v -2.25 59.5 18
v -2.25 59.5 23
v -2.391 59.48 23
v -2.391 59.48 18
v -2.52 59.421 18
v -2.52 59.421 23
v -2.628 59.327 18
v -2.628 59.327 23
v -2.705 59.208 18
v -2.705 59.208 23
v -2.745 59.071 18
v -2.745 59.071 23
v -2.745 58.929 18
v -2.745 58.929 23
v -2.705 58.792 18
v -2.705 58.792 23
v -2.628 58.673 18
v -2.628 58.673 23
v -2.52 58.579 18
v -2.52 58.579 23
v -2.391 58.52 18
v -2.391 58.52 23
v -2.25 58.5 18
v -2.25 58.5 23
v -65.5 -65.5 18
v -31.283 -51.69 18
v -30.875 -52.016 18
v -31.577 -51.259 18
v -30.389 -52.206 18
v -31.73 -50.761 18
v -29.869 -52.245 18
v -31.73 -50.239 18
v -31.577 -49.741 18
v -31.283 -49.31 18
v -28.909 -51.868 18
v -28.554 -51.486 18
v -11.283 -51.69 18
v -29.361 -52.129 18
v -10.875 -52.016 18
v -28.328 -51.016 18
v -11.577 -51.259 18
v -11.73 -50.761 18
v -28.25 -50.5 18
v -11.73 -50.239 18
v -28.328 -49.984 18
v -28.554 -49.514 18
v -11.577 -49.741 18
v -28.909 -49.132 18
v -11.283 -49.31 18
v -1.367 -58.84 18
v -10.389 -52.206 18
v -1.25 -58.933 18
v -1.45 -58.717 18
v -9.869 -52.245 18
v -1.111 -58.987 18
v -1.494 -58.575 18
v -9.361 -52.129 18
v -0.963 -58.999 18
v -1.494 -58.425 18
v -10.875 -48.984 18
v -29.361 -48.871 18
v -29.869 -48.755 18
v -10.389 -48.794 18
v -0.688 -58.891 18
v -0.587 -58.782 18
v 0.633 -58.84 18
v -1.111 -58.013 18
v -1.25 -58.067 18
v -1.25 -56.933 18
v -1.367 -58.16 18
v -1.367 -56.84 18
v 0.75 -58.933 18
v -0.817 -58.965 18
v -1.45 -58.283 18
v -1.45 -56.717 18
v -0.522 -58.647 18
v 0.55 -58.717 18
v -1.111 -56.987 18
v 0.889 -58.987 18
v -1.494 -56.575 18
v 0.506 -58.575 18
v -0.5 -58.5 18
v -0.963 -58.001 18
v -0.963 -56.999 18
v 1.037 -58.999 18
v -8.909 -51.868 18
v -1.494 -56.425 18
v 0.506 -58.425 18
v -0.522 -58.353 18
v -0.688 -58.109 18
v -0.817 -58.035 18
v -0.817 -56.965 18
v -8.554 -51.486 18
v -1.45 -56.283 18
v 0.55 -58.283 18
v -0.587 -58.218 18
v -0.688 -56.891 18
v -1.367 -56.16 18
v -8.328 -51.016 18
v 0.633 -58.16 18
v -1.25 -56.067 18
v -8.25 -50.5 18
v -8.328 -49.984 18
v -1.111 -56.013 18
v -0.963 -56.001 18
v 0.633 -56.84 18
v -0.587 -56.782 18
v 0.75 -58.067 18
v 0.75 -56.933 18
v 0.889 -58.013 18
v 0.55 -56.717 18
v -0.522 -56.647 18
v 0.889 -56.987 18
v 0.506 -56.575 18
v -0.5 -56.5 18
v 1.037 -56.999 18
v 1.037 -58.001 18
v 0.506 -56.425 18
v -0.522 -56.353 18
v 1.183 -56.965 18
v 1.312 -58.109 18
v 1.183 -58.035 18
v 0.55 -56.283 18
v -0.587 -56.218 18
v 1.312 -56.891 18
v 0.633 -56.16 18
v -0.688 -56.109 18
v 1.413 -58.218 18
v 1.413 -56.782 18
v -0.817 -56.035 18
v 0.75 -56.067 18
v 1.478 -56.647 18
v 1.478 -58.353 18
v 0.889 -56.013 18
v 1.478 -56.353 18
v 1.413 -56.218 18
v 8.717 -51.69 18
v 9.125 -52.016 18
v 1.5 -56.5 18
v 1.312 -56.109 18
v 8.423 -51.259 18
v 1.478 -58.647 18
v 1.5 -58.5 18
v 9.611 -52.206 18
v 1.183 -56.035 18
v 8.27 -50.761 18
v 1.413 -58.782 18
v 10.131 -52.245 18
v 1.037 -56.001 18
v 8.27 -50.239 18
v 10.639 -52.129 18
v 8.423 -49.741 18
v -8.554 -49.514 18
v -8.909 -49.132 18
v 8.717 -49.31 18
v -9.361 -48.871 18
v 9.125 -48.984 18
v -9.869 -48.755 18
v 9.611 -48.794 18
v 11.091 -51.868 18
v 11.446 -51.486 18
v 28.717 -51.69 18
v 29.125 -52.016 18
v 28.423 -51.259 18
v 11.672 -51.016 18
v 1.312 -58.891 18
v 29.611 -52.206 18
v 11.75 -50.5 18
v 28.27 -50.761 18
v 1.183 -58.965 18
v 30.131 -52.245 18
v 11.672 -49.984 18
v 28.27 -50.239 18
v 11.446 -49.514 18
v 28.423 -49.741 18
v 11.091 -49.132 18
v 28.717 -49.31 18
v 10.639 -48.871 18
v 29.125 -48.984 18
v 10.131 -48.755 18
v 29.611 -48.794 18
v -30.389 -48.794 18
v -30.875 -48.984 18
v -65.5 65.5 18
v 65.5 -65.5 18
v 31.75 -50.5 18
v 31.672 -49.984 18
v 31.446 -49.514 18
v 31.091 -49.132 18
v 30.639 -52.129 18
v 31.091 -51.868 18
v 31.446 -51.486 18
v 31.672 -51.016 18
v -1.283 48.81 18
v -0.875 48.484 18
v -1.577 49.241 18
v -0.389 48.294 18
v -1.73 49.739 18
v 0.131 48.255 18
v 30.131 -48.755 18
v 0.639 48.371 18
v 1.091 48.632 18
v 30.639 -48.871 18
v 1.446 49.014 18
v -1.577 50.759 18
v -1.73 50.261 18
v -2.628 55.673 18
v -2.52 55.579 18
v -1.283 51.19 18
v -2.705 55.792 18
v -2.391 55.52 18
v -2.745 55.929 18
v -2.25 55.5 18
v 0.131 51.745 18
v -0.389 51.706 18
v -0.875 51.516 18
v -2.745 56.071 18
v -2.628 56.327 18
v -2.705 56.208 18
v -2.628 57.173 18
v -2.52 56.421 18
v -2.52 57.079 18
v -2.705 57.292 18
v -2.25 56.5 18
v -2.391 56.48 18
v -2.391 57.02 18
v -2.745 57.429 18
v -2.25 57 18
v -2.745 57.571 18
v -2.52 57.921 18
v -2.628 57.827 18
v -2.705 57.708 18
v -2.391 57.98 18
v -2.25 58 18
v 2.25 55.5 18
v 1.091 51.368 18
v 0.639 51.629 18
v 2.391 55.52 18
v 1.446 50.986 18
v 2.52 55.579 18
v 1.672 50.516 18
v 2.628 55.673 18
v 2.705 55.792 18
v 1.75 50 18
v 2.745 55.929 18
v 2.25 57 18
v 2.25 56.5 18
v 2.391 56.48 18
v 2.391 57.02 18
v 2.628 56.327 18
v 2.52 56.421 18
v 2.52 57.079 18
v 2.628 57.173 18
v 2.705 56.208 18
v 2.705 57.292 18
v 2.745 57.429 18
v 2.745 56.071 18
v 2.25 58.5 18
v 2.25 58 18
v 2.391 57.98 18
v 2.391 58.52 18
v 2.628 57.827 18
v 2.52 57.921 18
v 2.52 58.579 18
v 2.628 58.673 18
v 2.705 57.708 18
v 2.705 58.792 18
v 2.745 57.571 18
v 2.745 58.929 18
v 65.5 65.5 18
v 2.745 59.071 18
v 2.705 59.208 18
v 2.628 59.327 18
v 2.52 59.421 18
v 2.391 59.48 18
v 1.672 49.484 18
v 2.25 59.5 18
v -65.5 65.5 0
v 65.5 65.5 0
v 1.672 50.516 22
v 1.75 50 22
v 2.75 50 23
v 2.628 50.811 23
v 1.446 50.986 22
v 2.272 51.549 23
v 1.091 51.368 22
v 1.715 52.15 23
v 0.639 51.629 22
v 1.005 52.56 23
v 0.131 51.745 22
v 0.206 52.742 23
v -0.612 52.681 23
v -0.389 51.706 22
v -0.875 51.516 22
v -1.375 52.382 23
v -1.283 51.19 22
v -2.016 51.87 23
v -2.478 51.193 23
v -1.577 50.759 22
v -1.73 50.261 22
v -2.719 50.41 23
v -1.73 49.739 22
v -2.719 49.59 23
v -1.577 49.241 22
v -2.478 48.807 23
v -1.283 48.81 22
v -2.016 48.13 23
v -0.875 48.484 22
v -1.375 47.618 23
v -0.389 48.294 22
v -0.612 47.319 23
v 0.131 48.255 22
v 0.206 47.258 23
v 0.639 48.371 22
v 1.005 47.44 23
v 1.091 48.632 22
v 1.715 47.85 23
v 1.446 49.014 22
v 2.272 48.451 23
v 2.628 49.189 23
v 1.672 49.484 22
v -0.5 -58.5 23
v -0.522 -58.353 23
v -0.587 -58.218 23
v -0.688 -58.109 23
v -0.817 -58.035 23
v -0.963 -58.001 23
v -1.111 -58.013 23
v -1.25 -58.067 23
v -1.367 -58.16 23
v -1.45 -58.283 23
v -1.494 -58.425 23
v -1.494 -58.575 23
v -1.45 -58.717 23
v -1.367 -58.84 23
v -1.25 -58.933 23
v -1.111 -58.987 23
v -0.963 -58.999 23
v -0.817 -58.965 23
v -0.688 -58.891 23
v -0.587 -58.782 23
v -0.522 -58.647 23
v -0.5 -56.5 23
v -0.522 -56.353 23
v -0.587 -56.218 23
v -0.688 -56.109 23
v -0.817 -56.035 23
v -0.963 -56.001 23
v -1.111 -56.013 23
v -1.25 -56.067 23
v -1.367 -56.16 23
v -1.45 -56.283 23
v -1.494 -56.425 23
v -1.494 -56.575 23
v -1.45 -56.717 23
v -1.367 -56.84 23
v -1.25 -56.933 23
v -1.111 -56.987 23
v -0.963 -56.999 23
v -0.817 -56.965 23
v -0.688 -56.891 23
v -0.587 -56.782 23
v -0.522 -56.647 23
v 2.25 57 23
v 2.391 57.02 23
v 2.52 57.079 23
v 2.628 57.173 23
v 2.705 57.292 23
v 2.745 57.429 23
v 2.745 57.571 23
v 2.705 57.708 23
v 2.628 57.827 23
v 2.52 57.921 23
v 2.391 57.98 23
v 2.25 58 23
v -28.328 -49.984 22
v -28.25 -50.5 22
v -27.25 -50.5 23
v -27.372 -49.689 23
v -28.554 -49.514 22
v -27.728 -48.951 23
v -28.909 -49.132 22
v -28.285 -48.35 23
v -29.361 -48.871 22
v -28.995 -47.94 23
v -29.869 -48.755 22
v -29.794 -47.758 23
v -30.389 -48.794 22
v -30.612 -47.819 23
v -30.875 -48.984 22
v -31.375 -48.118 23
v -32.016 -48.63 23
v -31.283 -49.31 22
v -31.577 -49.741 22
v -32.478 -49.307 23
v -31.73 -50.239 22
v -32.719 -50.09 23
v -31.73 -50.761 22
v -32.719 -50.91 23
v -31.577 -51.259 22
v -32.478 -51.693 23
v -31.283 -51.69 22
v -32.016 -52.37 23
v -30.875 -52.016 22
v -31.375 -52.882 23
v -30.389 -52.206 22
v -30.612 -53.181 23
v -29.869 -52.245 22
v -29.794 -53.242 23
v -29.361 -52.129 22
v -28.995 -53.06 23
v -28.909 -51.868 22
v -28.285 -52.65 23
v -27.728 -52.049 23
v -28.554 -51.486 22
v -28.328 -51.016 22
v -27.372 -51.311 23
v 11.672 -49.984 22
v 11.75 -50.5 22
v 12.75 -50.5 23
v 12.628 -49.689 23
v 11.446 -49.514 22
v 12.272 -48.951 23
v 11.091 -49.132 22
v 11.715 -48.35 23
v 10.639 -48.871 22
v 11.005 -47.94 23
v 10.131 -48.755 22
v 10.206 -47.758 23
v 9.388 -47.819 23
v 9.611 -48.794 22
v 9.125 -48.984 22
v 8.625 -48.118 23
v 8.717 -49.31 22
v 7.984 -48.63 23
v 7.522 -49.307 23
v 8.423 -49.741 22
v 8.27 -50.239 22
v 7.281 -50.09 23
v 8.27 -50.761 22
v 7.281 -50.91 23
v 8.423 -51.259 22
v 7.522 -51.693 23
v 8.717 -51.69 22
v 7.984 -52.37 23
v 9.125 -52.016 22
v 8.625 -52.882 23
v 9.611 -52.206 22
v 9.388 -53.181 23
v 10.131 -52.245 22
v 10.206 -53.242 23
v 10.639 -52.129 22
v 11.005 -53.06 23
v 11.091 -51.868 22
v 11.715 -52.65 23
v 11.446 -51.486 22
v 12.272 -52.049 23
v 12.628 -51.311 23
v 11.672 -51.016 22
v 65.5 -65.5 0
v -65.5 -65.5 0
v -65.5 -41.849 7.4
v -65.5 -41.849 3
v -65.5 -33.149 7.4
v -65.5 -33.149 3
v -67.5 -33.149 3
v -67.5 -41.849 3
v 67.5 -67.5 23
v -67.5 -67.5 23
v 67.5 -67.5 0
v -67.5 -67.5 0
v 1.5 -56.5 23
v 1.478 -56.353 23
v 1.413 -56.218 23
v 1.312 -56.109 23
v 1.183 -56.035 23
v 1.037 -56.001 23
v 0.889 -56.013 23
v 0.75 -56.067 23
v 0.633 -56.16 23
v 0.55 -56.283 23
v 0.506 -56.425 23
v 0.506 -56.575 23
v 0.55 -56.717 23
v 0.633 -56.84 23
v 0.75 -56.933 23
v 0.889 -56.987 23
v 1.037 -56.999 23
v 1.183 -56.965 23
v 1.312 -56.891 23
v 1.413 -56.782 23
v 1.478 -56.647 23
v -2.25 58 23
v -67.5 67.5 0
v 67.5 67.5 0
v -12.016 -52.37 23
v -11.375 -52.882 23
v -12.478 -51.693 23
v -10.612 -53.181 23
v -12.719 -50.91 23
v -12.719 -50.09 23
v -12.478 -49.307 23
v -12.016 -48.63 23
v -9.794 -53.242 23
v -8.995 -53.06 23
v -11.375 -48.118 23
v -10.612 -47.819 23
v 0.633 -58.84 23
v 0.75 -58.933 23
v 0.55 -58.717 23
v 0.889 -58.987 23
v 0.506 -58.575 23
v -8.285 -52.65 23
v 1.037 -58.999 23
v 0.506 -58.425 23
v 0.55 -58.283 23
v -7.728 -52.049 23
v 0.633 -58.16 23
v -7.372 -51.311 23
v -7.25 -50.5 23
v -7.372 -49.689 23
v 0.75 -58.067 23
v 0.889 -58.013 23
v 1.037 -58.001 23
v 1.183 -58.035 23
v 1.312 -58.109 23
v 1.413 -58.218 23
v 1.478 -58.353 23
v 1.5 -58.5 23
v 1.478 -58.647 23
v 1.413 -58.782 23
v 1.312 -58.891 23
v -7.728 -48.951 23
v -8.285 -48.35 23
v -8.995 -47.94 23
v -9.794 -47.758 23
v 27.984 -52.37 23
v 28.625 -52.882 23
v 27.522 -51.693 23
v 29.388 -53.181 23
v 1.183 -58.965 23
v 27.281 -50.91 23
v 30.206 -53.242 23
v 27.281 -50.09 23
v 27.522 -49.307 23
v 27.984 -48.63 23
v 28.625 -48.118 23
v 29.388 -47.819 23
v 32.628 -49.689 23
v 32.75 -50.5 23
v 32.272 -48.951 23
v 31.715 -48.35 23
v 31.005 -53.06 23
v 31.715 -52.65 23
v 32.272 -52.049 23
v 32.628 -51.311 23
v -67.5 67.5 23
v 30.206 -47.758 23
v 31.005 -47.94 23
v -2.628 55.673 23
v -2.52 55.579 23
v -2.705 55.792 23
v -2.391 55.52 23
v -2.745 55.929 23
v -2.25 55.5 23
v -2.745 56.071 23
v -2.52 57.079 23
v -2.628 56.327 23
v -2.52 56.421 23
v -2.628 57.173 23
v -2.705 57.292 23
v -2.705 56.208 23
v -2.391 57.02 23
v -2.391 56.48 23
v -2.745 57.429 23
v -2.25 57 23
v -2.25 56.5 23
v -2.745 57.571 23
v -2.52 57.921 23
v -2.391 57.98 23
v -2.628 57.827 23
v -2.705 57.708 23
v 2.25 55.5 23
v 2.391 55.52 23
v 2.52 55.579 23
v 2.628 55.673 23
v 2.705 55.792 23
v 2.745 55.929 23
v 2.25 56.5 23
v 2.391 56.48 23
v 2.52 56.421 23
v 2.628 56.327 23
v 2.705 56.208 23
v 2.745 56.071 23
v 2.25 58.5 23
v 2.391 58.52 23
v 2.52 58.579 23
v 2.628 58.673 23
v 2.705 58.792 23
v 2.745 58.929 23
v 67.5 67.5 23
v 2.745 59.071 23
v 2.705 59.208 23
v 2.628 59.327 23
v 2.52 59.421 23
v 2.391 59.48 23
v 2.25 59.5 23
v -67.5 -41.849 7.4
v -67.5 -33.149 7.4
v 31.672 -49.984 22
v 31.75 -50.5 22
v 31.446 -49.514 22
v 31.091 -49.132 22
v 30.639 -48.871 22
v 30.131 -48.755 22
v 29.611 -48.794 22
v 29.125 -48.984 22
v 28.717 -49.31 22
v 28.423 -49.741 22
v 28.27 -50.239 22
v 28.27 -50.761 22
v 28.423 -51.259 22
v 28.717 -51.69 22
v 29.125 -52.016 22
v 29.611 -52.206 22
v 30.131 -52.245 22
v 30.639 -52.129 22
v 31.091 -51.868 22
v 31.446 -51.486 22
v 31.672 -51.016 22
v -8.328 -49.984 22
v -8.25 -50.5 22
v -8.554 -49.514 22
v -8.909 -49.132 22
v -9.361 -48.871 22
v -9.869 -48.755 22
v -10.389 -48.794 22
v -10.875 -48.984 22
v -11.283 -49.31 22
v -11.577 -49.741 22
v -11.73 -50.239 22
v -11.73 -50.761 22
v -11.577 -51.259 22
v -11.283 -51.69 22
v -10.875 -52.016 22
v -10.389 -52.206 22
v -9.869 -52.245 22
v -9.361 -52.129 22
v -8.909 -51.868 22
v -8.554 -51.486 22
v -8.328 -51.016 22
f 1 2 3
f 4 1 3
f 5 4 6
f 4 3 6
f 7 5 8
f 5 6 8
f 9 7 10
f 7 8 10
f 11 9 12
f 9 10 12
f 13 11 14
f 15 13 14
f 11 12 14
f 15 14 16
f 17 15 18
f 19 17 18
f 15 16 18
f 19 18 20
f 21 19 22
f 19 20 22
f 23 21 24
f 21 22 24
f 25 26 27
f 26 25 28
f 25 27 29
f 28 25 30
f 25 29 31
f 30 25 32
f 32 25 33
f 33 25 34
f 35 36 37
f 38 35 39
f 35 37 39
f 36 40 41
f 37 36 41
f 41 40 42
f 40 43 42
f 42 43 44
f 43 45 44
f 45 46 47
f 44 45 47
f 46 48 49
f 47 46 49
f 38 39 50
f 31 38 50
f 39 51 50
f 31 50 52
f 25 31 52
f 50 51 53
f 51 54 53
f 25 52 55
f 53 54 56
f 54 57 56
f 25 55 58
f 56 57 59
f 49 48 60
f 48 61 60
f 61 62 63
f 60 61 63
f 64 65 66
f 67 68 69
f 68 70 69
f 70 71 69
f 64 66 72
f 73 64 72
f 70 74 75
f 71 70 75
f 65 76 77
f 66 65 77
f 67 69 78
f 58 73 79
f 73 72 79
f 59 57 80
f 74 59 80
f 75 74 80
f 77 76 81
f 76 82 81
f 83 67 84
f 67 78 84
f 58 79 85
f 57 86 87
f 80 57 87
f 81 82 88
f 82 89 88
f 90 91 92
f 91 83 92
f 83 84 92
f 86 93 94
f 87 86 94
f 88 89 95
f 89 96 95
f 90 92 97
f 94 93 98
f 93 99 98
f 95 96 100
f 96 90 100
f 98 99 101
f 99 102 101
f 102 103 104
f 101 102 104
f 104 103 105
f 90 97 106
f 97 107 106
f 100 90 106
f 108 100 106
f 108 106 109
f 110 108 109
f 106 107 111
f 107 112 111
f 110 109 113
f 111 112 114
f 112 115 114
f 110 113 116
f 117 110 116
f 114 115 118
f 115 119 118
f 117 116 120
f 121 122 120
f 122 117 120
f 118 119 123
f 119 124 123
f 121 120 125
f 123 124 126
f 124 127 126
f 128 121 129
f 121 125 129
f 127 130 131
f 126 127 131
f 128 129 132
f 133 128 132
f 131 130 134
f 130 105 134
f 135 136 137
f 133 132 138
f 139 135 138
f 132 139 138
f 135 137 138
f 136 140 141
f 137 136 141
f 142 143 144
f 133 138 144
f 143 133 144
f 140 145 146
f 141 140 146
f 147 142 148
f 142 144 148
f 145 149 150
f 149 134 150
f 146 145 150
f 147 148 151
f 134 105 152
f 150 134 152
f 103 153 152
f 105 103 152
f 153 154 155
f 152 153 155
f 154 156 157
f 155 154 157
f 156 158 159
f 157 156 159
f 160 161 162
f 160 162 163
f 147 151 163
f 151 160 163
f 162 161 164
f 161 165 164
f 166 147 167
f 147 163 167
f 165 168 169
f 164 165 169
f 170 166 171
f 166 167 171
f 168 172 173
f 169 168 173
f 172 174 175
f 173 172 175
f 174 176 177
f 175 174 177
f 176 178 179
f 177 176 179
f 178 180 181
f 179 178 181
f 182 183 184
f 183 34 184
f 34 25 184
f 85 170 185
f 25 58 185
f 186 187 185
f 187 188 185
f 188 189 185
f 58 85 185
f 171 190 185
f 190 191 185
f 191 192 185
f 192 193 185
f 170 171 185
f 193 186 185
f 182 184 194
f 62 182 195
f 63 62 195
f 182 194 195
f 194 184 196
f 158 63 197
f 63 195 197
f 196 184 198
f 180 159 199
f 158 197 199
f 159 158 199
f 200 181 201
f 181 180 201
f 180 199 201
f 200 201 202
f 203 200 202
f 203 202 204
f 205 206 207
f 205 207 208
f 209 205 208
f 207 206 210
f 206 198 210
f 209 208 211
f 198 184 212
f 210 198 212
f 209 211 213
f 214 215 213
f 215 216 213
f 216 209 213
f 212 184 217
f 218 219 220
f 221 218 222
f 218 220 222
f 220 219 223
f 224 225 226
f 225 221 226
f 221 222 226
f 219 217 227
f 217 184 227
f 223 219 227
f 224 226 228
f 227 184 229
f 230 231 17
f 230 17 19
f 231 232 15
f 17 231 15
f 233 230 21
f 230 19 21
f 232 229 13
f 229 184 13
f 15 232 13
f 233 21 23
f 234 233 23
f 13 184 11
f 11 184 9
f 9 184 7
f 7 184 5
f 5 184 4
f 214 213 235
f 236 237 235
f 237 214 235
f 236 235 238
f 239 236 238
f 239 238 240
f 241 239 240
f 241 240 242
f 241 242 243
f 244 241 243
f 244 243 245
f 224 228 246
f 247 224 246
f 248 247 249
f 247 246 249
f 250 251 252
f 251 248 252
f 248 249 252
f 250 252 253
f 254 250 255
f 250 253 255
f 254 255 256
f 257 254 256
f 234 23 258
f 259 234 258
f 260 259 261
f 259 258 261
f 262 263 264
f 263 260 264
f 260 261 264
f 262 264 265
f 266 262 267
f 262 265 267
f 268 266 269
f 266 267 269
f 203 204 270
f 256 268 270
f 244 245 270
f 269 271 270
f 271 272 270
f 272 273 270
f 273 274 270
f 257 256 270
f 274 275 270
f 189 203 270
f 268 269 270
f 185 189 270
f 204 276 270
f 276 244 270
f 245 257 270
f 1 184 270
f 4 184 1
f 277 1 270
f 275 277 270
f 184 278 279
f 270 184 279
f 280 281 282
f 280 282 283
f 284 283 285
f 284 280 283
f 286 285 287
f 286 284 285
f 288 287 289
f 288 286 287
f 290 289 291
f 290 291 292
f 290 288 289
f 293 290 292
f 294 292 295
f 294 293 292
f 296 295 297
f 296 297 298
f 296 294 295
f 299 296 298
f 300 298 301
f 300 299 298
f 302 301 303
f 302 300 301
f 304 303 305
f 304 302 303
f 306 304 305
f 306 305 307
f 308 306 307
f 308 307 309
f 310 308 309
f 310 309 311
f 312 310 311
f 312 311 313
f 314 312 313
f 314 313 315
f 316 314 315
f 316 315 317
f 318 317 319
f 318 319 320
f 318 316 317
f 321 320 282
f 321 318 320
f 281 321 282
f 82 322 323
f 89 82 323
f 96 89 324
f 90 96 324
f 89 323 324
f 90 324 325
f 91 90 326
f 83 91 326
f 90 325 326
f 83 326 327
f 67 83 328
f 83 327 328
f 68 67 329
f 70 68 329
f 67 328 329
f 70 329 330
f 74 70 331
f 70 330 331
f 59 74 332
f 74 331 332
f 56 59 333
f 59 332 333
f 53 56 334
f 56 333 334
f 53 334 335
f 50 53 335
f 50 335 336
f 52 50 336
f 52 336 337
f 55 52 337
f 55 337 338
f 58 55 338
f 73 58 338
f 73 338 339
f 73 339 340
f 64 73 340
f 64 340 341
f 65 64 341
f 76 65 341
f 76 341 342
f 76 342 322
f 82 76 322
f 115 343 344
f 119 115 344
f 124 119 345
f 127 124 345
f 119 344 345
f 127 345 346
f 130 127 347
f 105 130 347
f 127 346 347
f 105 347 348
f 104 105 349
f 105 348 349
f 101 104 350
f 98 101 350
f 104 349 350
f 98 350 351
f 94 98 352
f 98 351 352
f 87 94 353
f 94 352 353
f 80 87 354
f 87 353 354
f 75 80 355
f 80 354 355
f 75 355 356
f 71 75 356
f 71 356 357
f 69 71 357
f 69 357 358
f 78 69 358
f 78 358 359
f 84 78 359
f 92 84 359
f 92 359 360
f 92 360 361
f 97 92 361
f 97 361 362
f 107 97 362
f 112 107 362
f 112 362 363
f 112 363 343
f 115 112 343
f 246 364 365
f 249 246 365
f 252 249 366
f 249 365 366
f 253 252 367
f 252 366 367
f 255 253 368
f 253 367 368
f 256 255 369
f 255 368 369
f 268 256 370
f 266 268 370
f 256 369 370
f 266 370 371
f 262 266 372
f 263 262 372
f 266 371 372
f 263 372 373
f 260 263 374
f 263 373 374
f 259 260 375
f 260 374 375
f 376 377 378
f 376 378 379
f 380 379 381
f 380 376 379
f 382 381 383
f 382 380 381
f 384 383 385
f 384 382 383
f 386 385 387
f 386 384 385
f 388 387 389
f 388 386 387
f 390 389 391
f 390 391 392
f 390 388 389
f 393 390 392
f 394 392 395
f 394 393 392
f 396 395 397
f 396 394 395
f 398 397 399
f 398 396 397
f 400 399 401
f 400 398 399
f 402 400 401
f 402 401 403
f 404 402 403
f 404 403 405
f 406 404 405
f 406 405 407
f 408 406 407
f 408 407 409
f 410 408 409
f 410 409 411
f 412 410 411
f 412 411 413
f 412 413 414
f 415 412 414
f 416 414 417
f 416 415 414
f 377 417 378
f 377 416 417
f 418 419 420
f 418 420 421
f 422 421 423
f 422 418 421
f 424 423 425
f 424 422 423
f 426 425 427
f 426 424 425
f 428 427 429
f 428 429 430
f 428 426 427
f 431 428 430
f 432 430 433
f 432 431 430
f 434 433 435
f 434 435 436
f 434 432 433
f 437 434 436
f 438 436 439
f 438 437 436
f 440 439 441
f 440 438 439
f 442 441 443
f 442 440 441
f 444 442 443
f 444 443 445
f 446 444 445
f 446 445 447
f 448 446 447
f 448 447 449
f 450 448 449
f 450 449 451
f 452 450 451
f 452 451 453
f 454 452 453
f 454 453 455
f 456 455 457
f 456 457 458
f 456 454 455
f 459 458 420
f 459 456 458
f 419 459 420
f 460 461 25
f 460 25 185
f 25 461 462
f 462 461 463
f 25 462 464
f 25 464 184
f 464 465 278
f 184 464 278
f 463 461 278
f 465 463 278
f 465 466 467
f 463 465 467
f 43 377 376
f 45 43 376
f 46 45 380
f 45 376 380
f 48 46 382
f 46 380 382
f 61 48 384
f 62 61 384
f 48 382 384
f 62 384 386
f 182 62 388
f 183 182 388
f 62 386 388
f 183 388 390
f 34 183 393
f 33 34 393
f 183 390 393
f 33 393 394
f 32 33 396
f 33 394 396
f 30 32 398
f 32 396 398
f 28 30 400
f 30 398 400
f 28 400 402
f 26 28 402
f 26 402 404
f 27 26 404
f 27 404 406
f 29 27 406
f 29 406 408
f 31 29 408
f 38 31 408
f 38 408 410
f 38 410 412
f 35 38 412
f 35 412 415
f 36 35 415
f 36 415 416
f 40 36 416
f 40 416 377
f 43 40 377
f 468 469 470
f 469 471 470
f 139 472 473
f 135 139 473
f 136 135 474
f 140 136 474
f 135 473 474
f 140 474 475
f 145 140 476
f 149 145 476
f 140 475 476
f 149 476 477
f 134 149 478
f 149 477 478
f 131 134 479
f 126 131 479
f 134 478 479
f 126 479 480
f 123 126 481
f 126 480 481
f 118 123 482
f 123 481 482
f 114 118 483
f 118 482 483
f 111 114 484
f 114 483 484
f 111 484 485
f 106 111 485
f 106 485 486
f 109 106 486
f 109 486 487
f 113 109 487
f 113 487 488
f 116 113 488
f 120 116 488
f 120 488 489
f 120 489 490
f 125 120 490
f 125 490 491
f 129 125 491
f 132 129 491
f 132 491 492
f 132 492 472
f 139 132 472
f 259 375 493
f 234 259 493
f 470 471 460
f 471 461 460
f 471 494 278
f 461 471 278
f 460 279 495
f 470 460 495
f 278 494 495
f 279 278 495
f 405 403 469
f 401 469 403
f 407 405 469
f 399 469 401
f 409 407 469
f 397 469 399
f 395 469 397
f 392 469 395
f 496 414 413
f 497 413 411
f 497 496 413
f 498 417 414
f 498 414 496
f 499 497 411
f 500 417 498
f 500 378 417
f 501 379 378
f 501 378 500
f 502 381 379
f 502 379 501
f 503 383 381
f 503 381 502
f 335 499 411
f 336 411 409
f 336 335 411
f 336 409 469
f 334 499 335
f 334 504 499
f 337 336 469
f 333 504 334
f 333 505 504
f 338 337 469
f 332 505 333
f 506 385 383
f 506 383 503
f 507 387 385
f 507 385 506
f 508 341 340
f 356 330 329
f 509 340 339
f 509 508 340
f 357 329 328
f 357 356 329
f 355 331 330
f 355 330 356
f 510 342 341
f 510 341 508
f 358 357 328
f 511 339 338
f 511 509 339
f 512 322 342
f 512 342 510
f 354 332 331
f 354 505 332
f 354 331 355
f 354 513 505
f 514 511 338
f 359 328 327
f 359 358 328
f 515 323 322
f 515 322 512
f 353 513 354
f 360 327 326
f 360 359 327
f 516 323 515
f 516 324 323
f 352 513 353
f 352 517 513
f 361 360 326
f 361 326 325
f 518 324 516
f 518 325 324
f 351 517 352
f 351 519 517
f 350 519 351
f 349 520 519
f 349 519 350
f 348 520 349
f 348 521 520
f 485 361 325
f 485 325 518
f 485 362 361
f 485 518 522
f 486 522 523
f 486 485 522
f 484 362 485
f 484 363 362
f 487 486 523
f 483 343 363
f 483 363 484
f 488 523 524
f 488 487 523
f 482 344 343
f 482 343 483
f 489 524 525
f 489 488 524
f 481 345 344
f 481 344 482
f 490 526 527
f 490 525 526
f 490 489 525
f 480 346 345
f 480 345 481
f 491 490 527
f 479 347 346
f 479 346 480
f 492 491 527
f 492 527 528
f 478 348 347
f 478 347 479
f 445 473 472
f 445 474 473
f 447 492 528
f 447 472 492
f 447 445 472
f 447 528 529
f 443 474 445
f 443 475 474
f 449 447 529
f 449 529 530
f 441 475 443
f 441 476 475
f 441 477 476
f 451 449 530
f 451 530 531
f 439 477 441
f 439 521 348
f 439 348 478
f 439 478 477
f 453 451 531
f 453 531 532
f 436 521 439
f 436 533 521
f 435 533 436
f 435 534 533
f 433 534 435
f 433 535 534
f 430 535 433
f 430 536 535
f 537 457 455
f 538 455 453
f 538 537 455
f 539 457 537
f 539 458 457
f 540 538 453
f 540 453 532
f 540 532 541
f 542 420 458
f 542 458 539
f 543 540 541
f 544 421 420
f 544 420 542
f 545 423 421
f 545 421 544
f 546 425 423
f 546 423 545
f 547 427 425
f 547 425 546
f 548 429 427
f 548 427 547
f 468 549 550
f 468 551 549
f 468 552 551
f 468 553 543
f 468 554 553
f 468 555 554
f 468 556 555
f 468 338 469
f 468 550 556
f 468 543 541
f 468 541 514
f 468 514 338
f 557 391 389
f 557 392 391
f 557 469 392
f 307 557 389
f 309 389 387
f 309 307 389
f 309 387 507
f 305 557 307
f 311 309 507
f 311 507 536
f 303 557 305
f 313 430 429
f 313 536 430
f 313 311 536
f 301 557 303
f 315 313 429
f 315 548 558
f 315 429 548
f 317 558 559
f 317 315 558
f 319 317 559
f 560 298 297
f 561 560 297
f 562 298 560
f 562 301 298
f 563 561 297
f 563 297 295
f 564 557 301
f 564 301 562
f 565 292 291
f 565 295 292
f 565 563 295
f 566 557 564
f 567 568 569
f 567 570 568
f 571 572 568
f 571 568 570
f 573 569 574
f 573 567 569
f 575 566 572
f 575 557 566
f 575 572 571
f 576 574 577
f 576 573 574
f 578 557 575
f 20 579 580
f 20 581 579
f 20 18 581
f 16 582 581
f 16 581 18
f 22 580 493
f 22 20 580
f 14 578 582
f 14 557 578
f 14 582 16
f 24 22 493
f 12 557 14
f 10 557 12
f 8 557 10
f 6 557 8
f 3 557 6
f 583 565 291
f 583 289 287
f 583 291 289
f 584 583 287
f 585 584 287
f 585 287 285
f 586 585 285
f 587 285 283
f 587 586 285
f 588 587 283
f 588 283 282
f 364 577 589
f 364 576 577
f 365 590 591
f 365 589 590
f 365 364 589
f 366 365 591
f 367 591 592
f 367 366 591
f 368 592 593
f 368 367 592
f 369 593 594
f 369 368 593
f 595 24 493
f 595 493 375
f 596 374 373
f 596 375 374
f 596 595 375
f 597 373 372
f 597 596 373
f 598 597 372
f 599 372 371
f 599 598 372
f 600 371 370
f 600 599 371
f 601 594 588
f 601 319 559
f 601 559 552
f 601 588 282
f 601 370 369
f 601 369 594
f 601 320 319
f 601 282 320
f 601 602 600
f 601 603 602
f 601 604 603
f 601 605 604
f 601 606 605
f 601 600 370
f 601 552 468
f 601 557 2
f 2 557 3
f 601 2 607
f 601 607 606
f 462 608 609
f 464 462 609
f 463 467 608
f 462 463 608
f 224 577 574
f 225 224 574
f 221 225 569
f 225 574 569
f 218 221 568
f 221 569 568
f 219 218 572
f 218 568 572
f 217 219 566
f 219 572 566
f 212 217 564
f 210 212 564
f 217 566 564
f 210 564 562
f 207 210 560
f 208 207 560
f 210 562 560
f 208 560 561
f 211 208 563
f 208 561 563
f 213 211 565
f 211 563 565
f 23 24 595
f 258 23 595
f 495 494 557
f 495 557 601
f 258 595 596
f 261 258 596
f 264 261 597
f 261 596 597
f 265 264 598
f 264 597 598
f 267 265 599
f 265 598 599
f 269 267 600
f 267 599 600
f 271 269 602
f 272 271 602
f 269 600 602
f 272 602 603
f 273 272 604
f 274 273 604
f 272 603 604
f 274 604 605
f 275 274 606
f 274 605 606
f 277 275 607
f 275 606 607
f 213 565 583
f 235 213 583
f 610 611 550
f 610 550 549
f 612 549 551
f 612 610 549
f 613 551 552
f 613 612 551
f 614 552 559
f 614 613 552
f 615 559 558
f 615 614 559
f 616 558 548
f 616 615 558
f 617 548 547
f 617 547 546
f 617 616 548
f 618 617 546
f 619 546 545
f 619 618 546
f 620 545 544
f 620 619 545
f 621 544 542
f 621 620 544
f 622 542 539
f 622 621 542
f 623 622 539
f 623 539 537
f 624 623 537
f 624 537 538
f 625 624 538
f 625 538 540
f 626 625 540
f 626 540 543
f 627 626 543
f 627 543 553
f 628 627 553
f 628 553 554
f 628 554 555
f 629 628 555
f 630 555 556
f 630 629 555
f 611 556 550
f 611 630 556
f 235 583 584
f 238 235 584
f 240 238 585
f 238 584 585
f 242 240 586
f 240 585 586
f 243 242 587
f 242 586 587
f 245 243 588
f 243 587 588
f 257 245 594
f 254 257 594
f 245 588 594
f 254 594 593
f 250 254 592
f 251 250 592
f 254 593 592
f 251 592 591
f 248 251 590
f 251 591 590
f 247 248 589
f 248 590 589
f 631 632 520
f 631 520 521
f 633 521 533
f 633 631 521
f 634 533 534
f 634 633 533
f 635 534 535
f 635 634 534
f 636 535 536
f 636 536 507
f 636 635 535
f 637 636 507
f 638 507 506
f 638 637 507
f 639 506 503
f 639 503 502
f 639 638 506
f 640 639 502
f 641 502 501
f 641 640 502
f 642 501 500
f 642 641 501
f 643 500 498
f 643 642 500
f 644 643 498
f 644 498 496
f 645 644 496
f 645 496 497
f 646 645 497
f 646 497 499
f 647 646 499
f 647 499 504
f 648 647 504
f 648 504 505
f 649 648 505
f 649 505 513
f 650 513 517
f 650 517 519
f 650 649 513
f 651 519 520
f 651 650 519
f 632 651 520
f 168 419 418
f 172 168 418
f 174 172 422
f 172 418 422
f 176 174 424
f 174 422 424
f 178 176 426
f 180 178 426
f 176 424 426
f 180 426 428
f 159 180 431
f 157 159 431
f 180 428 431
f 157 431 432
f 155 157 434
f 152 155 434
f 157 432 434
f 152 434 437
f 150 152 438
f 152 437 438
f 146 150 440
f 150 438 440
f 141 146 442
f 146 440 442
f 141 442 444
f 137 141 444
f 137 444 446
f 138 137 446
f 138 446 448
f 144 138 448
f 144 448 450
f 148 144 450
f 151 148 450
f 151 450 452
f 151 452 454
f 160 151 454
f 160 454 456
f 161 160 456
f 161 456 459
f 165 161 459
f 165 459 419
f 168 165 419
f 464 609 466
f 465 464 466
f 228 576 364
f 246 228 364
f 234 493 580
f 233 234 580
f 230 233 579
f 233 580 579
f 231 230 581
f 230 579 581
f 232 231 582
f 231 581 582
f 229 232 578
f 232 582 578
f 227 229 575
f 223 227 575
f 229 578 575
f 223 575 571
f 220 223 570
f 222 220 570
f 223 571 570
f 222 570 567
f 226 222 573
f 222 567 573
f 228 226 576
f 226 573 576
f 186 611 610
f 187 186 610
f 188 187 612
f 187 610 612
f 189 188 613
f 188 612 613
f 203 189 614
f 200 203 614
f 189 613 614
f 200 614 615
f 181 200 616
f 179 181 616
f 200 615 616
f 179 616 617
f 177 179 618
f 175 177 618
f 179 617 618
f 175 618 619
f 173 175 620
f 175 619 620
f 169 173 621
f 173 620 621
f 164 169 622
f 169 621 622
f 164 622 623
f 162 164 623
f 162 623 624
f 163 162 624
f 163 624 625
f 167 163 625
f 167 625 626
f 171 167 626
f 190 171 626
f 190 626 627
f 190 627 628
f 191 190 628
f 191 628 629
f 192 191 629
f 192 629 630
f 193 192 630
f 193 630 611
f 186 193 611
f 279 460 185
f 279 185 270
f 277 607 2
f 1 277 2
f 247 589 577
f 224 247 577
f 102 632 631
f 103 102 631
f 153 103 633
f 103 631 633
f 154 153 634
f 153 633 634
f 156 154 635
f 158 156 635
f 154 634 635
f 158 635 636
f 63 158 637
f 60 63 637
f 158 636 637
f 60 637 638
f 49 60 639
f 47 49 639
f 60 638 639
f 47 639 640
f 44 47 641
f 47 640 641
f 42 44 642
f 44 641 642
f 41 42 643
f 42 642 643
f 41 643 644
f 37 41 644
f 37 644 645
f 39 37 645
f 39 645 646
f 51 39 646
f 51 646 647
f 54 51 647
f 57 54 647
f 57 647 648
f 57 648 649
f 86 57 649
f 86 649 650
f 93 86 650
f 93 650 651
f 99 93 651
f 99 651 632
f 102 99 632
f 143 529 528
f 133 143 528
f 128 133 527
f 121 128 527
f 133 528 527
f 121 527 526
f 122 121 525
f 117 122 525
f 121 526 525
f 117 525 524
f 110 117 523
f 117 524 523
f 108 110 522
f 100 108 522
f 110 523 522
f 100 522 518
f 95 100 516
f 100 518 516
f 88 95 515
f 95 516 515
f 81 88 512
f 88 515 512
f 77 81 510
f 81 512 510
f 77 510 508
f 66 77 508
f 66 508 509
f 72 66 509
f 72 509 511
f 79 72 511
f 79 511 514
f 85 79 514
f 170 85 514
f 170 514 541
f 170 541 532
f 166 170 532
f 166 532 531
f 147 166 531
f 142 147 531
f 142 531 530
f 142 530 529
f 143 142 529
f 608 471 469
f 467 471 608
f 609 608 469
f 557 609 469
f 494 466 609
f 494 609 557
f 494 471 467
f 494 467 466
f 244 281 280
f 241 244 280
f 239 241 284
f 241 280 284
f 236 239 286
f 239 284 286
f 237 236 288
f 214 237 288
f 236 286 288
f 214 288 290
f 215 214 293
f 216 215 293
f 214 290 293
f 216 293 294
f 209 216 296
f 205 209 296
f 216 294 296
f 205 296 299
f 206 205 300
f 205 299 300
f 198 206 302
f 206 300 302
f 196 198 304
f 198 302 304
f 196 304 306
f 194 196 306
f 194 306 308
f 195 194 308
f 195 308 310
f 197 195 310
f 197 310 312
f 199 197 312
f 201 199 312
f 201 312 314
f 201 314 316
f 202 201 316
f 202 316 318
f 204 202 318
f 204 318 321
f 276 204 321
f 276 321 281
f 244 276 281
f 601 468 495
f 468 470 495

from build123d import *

# Parameters (mm, degrees)
SKIZZE1_W                       = 135
SKIZZE1_H                       = 135
SKIZZE1_W_2                     = 131
SKIZZE1_H_2                     = 131
AUFSATZ_LINEAR_AUSTRAGEN1_DEPTH = 18
SKIZZE2_W                       = 135
SKIZZE2_H                       = 135
AUFSATZ_LINEAR_AUSTRAGEN2_DEPTH = 5
SCHNITT_LINEAR_AUSTRAGEN1_DEPTH = 11
SKIZZE4_R                       = 1.75
SKIZZE4_R_2                     = 0.5
SCHNITT_LINEAR_AUSTRAGEN2_DEPTH = 10
FASE1_SIZE                      = 1


with BuildPart() as part:
    # Skizze1 → Aufsatz-Linear austragen1 (new body)
    with BuildSketch(Plane.XY):
        Rectangle(SKIZZE1_W, SKIZZE1_H)
        Rectangle(SKIZZE1_W_2, SKIZZE1_H_2, mode=Mode.SUBTRACT)
    extrude(amount=AUFSATZ_LINEAR_AUSTRAGEN1_DEPTH)

    # Skizze2 → Aufsatz-Linear austragen2 (add)
    with BuildSketch(Plane.XY.offset(18)):
        Rectangle(SKIZZE2_W, SKIZZE2_H)
    extrude(amount=AUFSATZ_LINEAR_AUSTRAGEN2_DEPTH)

    # Skizze3 → Schnitt-Linear austragen1 (cut)
    with BuildSketch(Plane.ZY.offset(67.5)):
        Polygon((5, -33.148996127), (3, -33.148996127), (3, -41.848996127), (5, -41.848996127), (7.4, -41.848996127), (7.4, -33.148996127), align=None)
    extrude(amount=-SCHNITT_LINEAR_AUSTRAGEN1_DEPTH, mode=Mode.SUBTRACT)

    # Skizze4 → Schnitt-Linear austragen2 (cut)
    with BuildSketch(Plane.XY.offset(23)):
        with BuildLine():
            Line((2.25, 56.5), (-2.25, 56.5))
            ThreePointArc((-2.25, 56.5), (-2.75, 56), (-2.25, 55.5))
            Line((-2.25, 55.5), (2.25, 55.5))
            ThreePointArc((2.25, 55.5), (2.75, 56), (2.25, 56.5))
        make_face()
        with BuildLine():
            Line((2.25, 58), (-2.25, 58))
            ThreePointArc((-2.25, 58), (-2.75, 57.5), (-2.25, 57))
            Line((-2.25, 57), (2.25, 57))
            ThreePointArc((2.25, 57), (2.75, 57.5), (2.25, 58))
        make_face()
        with BuildLine():
            Line((2.25, 59.5), (-2.25, 59.5))
            ThreePointArc((-2.25, 59.5), (-2.75, 59), (-2.25, 58.5))
            Line((-2.25, 58.5), (2.25, 58.5))
            ThreePointArc((2.25, 58.5), (2.75, 59), (2.25, 59.5))
        make_face()
        with Locations((0, 50)):
            Circle(SKIZZE4_R)
        with Locations((30, -50.5)):
            Circle(SKIZZE4_R)
        with Locations((10, -50.5)):
            Circle(SKIZZE4_R)
        with Locations((-10, -50.5)):
            Circle(SKIZZE4_R)
        with Locations((-30, -50.5)):
            Circle(SKIZZE4_R)
        with Locations((1, -56.5)):
            Circle(SKIZZE4_R_2)
        with Locations((1, -58.5)):
            Circle(SKIZZE4_R_2)
        with Locations((-1, -58.5)):
            Circle(SKIZZE4_R_2)
        with Locations((-1, -56.5)):
            Circle(SKIZZE4_R_2)
    extrude(amount=-SCHNITT_LINEAR_AUSTRAGEN2_DEPTH, mode=Mode.SUBTRACT)

    # Fase1
    fase1_edges = [part.edges().sort_by_distance(p)[0] for p in [
        (8.25, -50.5, 23),
        (-11.75, -50.5, 23),
        (-31.75, -50.5, 23),
        (28.25, -50.5, 23),
        (-1.75, 50, 23),
    ]]
    chamfer(fase1_edges, length=FASE1_SIZE)


solid = part.part
